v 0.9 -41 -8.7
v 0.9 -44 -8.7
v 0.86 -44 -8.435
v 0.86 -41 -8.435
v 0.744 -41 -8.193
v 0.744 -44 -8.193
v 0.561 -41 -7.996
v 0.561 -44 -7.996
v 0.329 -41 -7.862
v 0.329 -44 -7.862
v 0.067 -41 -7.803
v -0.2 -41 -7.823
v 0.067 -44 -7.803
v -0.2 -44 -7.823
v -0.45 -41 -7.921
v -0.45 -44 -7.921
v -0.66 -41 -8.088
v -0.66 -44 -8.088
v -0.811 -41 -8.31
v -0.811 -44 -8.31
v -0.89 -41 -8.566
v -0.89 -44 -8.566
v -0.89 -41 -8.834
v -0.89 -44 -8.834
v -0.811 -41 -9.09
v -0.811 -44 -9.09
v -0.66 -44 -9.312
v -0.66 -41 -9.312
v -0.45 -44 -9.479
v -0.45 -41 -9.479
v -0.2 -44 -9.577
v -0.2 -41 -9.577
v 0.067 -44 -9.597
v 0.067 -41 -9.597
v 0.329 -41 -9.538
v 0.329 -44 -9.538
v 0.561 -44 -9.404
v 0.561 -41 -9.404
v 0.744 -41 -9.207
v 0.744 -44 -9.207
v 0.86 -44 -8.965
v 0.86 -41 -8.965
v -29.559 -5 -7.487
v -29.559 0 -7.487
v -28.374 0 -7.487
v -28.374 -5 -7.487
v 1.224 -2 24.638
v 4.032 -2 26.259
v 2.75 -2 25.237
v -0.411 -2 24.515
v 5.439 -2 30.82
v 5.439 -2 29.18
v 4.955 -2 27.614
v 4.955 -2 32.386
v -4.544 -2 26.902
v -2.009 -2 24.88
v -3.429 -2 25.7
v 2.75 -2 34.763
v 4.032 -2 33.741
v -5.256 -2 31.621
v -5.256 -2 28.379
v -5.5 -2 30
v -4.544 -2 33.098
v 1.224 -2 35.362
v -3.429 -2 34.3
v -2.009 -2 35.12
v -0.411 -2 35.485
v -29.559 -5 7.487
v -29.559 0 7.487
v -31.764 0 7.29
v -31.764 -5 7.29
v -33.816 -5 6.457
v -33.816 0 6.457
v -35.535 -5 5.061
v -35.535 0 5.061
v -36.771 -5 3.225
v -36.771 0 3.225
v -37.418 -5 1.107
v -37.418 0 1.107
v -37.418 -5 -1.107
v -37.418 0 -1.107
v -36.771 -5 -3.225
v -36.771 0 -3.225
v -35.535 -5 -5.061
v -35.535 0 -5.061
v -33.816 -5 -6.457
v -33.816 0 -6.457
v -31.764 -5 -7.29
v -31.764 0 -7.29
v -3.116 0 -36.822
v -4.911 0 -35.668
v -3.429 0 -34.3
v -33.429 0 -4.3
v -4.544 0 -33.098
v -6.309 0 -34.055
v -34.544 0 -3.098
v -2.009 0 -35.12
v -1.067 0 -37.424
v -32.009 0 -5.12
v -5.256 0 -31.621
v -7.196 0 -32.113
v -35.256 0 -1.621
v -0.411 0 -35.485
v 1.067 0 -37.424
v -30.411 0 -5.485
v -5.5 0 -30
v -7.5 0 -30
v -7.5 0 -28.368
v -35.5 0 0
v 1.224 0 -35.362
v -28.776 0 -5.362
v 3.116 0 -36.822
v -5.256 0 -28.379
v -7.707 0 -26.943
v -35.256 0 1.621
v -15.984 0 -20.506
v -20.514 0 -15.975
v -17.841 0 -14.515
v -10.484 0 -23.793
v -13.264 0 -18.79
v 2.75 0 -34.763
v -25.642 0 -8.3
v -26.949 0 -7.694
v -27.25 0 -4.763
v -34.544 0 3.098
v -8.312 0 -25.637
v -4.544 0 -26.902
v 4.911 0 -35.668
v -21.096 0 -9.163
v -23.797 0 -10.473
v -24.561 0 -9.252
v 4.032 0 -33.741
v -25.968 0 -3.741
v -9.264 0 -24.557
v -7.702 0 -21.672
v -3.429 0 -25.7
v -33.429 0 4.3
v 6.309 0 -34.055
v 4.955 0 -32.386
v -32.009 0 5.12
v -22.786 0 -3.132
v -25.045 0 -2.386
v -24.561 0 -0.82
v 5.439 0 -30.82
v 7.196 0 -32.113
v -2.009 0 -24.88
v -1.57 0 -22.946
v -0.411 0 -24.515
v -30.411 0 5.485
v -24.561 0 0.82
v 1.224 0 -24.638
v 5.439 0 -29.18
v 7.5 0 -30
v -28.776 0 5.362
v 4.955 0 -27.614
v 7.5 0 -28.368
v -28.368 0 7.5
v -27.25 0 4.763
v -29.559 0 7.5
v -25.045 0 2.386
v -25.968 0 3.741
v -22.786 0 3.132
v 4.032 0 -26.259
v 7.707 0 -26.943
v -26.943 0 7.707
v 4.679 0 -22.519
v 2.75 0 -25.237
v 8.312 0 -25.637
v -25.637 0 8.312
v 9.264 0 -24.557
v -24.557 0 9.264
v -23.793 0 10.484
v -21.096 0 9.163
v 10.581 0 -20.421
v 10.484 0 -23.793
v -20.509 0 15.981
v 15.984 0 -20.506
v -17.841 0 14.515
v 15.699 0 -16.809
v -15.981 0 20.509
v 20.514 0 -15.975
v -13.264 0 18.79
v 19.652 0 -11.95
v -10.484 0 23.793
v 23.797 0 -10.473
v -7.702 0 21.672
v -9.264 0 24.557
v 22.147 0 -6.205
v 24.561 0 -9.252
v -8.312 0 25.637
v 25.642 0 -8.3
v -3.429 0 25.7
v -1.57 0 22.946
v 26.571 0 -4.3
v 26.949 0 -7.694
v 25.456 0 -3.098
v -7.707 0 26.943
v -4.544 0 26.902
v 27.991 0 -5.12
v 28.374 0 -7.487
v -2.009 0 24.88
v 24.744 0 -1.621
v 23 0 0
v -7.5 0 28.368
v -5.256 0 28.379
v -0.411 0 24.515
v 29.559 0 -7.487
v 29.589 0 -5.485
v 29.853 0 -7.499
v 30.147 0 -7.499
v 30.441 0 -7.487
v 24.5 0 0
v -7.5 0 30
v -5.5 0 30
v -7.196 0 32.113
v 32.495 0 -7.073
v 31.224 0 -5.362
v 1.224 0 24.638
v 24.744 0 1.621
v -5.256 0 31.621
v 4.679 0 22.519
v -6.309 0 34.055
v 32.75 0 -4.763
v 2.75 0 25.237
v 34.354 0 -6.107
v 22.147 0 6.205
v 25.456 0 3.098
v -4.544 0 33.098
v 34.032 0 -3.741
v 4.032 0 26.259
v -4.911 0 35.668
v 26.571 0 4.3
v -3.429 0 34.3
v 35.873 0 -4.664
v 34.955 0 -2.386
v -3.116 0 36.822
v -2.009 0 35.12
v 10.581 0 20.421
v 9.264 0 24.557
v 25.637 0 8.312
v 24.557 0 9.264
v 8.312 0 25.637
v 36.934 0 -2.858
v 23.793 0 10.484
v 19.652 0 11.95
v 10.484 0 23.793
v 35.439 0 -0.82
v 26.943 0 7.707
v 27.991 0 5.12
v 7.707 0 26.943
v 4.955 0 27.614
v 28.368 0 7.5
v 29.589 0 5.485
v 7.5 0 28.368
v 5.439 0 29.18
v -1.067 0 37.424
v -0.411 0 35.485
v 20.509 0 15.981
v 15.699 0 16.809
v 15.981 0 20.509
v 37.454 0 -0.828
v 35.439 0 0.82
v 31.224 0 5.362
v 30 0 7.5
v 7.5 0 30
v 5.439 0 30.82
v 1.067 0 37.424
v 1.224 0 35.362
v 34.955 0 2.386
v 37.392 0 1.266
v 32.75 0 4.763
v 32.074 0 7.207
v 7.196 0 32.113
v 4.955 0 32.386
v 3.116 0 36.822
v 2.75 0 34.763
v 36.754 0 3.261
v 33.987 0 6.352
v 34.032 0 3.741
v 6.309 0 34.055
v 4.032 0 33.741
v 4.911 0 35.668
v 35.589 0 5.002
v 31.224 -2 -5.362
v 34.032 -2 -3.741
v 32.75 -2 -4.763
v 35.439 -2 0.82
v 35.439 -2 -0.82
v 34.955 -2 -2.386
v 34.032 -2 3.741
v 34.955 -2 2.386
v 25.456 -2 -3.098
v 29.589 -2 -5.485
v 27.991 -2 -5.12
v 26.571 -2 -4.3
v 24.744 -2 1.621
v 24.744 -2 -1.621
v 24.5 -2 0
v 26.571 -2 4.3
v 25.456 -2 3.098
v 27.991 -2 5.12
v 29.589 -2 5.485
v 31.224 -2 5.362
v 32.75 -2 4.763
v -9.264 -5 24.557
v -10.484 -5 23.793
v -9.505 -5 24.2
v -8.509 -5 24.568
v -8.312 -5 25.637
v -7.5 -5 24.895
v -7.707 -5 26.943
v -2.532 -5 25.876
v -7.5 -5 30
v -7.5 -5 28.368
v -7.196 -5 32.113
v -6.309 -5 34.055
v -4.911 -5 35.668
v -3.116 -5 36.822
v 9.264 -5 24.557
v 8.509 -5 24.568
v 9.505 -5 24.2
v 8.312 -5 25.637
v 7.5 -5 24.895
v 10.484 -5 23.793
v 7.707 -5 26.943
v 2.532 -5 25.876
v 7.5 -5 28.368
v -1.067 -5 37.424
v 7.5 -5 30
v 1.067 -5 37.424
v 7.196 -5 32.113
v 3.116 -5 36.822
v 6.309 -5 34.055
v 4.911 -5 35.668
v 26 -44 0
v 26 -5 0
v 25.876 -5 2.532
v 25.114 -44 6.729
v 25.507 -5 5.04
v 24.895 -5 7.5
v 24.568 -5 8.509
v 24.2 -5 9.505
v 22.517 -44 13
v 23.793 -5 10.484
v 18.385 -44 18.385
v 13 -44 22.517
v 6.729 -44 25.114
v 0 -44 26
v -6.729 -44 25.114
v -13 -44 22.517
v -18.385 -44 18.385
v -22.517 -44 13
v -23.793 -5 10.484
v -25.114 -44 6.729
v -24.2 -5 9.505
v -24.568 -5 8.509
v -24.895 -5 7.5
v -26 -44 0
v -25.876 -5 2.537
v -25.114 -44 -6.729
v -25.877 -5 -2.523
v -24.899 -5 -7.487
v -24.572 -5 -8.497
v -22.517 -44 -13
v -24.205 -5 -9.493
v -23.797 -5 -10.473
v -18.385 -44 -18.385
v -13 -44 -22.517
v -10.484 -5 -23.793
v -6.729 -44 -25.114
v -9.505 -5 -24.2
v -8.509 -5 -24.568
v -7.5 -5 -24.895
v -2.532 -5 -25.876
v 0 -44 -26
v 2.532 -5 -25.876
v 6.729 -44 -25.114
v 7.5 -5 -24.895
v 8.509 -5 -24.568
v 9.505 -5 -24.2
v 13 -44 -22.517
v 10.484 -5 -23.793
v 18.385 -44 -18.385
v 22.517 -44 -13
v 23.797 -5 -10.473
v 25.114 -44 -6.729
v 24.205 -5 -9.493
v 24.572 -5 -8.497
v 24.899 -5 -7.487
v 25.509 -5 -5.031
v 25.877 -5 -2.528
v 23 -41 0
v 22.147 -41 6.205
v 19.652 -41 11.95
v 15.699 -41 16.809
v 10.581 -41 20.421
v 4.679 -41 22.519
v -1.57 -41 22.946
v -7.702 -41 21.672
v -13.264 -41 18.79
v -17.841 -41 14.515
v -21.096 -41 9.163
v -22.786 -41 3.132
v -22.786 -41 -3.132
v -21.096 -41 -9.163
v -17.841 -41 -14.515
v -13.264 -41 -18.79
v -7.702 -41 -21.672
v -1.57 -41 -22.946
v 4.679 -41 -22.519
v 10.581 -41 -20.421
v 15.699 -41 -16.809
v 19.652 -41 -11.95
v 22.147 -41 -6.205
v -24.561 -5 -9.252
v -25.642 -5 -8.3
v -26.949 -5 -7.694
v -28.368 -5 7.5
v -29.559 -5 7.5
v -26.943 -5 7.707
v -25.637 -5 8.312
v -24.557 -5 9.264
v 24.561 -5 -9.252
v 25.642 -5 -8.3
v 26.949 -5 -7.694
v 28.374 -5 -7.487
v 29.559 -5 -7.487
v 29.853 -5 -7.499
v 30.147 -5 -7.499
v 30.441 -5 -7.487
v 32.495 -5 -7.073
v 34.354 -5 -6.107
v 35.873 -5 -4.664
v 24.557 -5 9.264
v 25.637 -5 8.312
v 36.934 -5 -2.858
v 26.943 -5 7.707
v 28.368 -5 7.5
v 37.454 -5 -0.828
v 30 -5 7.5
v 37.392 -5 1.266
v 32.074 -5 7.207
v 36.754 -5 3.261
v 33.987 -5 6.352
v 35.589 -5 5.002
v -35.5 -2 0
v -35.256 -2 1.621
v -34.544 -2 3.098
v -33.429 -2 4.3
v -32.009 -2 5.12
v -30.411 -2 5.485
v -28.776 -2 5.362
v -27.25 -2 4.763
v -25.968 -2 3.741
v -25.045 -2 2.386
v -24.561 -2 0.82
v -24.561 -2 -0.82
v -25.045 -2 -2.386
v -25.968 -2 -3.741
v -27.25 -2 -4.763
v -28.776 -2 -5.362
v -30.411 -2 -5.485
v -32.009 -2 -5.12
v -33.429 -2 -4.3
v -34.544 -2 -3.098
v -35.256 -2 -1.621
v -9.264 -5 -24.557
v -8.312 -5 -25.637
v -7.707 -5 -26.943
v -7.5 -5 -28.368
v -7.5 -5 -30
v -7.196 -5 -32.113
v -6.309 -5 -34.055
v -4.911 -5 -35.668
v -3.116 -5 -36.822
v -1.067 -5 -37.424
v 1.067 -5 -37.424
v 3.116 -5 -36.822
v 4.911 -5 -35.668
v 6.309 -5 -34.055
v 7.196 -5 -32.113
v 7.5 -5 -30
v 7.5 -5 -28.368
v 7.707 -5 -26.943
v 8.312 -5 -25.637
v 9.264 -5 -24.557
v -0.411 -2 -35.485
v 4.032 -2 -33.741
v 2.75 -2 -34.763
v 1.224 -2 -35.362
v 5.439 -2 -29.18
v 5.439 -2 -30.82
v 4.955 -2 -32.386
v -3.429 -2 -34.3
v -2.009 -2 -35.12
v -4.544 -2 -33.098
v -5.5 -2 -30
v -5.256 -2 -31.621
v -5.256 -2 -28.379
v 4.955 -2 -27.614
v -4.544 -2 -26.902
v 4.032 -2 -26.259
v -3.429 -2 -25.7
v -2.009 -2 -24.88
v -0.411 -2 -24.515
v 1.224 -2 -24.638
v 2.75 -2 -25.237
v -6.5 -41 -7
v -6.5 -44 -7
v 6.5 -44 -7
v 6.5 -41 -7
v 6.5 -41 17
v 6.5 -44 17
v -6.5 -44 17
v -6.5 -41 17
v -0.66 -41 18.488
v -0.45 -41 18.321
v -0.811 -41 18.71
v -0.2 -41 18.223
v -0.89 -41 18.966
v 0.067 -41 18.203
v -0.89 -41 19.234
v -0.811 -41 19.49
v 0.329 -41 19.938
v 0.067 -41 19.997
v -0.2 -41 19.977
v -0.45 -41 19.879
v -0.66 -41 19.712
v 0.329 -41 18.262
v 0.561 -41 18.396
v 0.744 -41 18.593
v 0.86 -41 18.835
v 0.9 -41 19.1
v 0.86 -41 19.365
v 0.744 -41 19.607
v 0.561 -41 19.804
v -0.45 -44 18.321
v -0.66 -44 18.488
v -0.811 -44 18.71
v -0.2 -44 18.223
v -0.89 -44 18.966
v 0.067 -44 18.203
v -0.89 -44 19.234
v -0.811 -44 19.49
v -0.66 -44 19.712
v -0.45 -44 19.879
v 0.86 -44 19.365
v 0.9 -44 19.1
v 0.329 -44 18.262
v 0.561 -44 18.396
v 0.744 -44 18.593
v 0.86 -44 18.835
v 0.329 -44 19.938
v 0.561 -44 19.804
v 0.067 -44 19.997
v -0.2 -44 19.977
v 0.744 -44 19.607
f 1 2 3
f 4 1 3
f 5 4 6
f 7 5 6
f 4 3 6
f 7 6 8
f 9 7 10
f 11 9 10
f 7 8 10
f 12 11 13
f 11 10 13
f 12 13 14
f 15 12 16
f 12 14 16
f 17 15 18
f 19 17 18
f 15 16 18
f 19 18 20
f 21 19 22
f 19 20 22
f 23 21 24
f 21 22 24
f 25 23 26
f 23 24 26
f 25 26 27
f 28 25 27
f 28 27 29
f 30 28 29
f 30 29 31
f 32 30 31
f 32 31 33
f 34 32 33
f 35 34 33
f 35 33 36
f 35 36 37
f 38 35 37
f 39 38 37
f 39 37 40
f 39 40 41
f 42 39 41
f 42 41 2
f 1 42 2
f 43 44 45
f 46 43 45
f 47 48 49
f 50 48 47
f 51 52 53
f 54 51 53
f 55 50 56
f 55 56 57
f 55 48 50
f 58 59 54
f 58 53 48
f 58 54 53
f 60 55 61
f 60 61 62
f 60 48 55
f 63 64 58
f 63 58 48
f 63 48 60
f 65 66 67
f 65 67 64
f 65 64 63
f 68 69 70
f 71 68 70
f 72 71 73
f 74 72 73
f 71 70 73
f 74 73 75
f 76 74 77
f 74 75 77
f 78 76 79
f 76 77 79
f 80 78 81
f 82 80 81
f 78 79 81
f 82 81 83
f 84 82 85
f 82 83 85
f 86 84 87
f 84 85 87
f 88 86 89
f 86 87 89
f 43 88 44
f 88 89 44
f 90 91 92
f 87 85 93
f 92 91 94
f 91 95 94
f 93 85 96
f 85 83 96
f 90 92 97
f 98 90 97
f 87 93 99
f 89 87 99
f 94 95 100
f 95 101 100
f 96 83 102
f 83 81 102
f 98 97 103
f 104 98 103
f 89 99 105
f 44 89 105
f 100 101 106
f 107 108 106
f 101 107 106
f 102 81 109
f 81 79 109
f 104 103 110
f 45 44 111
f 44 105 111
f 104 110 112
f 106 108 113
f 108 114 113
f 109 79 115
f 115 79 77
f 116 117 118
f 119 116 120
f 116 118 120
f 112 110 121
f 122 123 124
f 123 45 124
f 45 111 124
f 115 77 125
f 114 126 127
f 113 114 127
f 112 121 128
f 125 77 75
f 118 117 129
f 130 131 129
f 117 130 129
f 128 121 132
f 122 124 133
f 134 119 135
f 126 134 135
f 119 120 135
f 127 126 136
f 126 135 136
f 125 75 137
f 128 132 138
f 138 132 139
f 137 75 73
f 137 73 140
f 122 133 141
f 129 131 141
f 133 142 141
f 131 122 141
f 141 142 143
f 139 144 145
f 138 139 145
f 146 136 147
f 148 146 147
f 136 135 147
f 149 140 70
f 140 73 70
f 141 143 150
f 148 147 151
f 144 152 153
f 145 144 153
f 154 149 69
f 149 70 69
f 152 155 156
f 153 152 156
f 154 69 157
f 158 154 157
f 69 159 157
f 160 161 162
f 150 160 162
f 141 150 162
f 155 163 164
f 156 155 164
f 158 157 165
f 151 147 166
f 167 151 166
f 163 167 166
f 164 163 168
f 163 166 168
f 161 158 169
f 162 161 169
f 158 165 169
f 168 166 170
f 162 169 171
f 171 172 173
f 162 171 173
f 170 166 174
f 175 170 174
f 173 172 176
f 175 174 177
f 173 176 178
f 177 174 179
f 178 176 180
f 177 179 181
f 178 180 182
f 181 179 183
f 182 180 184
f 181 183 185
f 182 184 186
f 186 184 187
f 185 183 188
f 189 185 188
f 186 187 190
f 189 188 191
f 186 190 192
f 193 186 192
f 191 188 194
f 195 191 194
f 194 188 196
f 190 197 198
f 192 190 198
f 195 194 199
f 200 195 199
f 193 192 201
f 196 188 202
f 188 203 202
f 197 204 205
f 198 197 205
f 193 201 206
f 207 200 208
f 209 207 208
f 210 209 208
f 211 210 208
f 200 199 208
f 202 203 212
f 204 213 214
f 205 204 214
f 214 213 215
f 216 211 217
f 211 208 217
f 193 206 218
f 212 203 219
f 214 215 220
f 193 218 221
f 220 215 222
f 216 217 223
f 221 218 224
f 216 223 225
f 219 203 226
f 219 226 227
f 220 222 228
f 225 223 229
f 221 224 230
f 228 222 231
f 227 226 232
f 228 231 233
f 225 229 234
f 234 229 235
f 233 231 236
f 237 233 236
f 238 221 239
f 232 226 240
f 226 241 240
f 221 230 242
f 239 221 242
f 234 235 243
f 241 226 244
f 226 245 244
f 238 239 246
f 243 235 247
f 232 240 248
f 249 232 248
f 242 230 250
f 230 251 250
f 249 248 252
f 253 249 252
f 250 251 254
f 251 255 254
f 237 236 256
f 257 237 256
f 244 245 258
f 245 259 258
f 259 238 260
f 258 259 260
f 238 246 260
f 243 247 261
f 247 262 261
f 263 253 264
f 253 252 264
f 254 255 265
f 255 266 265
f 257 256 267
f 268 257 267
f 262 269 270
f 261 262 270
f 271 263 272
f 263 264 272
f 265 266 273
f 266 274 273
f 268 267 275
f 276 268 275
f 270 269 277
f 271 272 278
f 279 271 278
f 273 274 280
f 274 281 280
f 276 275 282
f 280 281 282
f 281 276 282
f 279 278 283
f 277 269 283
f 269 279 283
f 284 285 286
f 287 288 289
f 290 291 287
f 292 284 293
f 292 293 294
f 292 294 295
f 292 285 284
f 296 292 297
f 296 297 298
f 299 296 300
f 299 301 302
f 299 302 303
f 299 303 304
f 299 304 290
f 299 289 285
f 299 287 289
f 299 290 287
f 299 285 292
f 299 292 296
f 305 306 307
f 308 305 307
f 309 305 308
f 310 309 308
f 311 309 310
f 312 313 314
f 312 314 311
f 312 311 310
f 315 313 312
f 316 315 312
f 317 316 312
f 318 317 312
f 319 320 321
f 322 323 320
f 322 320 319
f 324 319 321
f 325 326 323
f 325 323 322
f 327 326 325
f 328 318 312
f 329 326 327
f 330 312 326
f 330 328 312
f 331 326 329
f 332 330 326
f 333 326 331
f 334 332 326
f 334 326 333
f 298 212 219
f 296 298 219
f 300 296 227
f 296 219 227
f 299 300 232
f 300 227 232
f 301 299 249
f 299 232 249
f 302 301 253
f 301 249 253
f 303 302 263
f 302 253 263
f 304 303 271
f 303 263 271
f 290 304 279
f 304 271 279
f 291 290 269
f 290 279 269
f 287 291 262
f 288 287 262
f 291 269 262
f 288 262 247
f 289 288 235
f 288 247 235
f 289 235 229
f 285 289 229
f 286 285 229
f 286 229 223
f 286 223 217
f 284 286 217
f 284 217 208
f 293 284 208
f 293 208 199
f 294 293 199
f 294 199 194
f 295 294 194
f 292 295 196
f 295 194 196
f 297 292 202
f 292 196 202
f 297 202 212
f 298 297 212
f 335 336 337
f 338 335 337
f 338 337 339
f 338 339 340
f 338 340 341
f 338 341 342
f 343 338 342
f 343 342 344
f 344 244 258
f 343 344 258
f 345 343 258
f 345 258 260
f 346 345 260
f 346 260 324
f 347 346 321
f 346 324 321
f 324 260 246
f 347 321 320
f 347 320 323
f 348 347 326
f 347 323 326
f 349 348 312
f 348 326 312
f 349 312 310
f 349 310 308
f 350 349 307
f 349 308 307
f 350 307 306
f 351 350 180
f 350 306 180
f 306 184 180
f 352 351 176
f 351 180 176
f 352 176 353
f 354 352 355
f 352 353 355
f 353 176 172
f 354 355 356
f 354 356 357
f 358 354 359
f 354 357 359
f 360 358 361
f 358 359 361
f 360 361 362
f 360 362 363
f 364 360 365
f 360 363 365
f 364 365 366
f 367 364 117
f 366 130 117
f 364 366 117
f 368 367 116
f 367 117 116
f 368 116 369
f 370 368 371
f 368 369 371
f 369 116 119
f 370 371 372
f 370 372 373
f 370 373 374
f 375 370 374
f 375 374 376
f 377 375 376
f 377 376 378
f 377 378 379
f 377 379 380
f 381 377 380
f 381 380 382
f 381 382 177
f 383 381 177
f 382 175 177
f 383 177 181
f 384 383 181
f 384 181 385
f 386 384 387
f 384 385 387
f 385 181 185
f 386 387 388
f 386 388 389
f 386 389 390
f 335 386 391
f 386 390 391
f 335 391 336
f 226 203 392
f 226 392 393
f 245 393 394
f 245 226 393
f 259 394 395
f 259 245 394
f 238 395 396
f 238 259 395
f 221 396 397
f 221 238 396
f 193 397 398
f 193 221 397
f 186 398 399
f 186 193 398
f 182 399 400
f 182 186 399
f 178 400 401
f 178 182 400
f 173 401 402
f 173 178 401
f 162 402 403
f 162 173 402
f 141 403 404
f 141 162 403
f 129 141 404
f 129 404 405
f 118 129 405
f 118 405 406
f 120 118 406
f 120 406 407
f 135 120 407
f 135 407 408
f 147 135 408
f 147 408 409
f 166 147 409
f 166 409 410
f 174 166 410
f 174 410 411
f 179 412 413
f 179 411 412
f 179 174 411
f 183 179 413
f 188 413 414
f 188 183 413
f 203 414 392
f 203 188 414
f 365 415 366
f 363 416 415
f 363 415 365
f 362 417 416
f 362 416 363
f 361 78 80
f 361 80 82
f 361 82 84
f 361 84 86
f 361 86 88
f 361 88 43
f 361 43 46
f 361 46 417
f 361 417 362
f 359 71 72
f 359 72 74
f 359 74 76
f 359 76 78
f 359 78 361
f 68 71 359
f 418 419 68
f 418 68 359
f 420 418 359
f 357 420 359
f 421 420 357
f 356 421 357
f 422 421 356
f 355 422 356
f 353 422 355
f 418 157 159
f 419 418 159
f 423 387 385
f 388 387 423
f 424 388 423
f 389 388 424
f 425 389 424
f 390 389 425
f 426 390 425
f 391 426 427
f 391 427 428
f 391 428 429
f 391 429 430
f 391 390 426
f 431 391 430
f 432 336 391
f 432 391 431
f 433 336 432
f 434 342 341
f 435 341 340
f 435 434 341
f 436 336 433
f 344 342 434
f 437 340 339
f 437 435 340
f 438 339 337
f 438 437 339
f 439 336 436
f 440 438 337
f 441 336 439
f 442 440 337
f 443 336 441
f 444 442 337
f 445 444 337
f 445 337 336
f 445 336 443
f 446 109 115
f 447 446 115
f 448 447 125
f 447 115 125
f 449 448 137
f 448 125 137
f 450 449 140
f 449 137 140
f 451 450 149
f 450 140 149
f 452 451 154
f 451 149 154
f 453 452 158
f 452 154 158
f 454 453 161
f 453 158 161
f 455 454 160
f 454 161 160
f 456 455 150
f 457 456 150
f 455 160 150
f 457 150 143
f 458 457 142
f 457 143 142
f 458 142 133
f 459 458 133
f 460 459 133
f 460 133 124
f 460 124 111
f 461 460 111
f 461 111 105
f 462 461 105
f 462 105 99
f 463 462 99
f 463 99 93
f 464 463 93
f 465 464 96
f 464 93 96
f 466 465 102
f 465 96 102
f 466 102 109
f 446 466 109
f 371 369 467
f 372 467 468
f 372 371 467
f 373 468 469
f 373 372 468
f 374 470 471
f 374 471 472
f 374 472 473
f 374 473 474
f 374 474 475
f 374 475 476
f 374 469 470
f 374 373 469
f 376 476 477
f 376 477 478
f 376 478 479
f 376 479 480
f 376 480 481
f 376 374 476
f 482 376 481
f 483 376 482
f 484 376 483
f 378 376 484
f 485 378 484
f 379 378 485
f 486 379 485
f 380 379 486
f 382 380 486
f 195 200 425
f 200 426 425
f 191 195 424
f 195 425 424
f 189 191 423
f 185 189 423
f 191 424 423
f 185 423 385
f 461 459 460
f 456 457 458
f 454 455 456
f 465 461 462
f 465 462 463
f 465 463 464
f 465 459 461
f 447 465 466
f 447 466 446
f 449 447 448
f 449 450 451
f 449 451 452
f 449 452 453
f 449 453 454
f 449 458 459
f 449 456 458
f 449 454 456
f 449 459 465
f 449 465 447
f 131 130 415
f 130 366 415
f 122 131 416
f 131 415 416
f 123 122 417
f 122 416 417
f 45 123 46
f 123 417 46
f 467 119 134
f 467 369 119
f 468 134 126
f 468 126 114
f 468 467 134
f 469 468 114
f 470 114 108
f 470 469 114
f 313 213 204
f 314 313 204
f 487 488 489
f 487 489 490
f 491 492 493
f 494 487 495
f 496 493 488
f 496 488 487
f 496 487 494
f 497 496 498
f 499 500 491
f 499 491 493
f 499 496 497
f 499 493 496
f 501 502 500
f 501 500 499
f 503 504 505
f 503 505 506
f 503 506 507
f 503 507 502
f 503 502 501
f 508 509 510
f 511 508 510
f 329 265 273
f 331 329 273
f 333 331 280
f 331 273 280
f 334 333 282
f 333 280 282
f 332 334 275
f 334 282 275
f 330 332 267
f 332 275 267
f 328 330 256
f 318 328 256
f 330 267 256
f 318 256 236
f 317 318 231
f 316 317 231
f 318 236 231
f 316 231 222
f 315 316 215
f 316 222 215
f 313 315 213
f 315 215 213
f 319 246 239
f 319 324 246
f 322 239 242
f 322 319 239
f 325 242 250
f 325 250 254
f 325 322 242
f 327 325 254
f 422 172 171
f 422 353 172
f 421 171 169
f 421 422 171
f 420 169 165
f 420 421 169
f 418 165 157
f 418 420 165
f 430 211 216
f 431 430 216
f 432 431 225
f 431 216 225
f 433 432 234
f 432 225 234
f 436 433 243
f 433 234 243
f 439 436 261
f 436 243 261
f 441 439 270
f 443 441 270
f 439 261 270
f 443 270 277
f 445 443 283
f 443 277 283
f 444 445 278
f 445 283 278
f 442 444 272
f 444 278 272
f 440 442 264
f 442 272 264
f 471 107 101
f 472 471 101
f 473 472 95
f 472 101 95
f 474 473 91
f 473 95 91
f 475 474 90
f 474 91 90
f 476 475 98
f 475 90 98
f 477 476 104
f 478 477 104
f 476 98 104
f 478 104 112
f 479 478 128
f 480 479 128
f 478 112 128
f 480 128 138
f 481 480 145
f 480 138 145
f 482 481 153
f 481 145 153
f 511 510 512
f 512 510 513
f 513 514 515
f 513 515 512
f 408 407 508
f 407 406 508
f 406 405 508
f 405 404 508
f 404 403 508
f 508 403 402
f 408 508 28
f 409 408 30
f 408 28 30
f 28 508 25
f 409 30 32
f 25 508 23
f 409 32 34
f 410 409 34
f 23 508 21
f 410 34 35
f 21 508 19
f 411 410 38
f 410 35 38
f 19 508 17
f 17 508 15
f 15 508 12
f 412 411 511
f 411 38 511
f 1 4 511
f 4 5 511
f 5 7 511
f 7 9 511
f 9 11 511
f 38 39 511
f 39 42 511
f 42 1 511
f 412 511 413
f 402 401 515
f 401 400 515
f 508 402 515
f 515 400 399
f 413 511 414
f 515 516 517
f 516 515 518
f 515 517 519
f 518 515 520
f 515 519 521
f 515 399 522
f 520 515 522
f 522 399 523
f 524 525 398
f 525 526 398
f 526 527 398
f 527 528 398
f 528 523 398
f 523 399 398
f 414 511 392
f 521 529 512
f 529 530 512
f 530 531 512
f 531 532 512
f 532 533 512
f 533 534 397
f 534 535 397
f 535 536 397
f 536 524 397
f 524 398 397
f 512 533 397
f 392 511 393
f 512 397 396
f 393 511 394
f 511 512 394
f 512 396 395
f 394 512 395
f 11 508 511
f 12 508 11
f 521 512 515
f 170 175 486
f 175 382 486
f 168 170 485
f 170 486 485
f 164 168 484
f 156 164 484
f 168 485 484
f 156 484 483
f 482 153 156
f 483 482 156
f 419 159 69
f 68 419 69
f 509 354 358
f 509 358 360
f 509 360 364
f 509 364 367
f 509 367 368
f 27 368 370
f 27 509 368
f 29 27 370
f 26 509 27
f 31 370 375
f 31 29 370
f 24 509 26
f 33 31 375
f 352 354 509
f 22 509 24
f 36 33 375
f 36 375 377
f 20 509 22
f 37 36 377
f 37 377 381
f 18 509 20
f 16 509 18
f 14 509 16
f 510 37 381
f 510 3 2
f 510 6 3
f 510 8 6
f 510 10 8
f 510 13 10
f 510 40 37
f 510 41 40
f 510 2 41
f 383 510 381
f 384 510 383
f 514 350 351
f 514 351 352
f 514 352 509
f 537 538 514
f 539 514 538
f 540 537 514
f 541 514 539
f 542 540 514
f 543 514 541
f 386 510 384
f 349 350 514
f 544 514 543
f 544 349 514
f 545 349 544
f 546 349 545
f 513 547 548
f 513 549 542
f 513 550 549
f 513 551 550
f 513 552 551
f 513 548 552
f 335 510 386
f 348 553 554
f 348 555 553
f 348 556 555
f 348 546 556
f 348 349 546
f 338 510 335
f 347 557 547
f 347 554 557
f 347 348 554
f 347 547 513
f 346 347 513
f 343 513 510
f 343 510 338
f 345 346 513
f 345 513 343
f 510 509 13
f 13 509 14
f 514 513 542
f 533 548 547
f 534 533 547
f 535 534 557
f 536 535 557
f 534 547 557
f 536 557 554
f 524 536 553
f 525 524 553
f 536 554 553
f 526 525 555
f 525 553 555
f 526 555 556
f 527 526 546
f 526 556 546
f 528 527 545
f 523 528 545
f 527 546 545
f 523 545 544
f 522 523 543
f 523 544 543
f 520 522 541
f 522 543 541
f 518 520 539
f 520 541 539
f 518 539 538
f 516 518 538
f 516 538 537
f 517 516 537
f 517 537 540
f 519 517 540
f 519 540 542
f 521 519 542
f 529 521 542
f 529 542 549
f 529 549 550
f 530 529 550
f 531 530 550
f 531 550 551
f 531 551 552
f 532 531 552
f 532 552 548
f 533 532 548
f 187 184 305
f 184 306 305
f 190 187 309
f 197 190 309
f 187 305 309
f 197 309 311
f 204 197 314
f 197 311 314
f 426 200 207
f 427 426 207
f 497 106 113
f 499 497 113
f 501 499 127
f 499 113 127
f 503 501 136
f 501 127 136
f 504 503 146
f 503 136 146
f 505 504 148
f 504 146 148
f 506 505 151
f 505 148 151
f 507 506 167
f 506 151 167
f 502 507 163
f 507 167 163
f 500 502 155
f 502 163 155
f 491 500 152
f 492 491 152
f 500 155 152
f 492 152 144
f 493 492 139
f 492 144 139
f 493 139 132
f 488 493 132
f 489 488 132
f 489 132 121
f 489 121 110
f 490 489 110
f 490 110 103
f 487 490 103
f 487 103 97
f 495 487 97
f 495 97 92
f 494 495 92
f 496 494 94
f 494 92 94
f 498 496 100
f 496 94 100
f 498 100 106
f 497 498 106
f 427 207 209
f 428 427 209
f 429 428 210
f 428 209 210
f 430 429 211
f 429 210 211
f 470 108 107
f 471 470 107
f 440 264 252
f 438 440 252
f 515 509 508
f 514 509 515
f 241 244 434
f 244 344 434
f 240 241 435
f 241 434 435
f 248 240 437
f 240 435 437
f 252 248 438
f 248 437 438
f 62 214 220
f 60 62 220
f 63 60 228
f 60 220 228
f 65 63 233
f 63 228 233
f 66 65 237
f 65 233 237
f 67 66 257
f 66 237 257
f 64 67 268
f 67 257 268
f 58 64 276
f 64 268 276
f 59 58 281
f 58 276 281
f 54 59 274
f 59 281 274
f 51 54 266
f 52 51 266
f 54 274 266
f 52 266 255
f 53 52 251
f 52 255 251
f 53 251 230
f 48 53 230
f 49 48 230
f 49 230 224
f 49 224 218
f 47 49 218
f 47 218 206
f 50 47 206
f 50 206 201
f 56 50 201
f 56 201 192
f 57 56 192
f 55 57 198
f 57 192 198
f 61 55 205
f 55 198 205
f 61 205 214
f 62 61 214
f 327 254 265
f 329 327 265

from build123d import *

# Parameters (mm, degrees)
F0_R      = 26
F1_DEPTH  = 44
F2_T      = -3
F4_DEPTH  = 5
F5_W      = 13
F5_H      = 24
F6_DEPTH  = 25
F7_R      = 0.9
F8_DEPTH  = 44.001
F9_R      = 5.5
F10_DEPTH = 2
F11_R     = 5


with BuildPart() as f1:
    # F0 (on Front) → F1 (new body)
    with BuildSketch(Plane.XZ):
        Circle(F0_R)
    extrude(amount=F1_DEPTH)

    # F2
    f2_openings = [f1.faces().sort_by_distance(p)[0] for p in [
        (0, 0, 0),
    ]]
    offset(amount=F2_T, openings=f2_openings)

    # F3 (on Front) → F4 (join)
    with BuildSketch(Plane.XZ):
        with BuildLine():
            ThreePointArc((-24.8986899768, -7.4870045706), (-25.9999991145, 0.0067856521), (-24.894778569, 7.5))
            Line((-24.894778569, 7.5), (-29.5586808862, 7.5))
            Line((-29.5586808862, 7.5), (-29.5586808862, 7.4870045706))
            ThreePointArc((-29.5586808862, 7.4870045706), (-37.5, 0), (-29.5586808862, -7.4870045706))
            Line((-29.5586808862, -7.4870045706), (-24.8986899768, -7.4870045706))
        make_face()
        with BuildLine():
            Line((7.5, 24.894778569), (7.5, 30))
            ThreePointArc((7.5, 30), (0, 37.5), (-7.5, 30))
            Line((-7.5, 30), (-7.5, 24.894778569))
            ThreePointArc((-7.5, 24.894778569), (0, 26), (7.5, 24.894778569))
        make_face()
        with BuildLine():
            Line((-7.5, -24.894778569), (-7.5, -30))
            ThreePointArc((-7.5, -30), (0, -37.5), (7.5, -30))
            Line((7.5, -30), (7.5, -24.894778569))
            ThreePointArc((7.5, -24.894778569), (0, -26), (-7.5, -24.894778569))
        make_face()
        with BuildLine():
            Line((30.4413191138, -7.4870045706), (29.5586808862, -7.4870045706))
            ThreePointArc((29.5586808862, -7.4870045706), (30, -7.5), (30.4413191138, -7.4870045706))
        make_face()
        with BuildLine():
            Line((24.8986899768, -7.4870045706), (29.5586808862, -7.4870045706))
            Line((29.5586808862, -7.4870045706), (30.4413191138, -7.4870045706))
            ThreePointArc((30.4413191138, -7.4870045706), (37.4967504387, 0.2207552046), (30, 7.5))
            Line((30, 7.5), (24.894778569, 7.5))
            ThreePointArc((24.894778569, 7.5), (25.9999991145, 0.0067856521), (24.8986899768, -7.4870045706))
        make_face()
    extrude(amount=F4_DEPTH)

    # F5 (on face) → F6 (cut)
    with BuildSketch(Plane.XZ.offset(44)):
        with Locations((0, 5)):
            Rectangle(F5_W, F5_H)
    extrude(amount=-F6_DEPTH, mode=Mode.SUBTRACT)

    # F7 (on face) → F8 (cut, through all)
    with BuildSketch(Plane.XZ.offset(44)):
        with Locations((0, -8.7)):
            Circle(F7_R)
        with Locations((0, 19.1)):
            Circle(F7_R)
    extrude(amount=-F8_DEPTH, mode=Mode.SUBTRACT)

    # F9 (on face) → F10 (cut)
    with BuildSketch(Plane(origin=(0, 0, 0), x_dir=(-1, 0, 0), z_dir=(0, 1, 0))):
        with Locations((-30, 0)):
            Circle(F9_R)
        with Locations((0, 30)):
            Circle(F9_R)
        with Locations((30, 0)):
            Circle(F9_R)
        with Locations((0, -30)):
            Circle(F9_R)
    extrude(amount=-F10_DEPTH, mode=Mode.SUBTRACT)

    # F11
    f11_edges = [f1.edges().sort_by_distance(p)[0] for p in [
        (24.89869, -2.5, -7.487005),
        (7.5, -2.5, -24.894779),
        (-7.5, -2.5, -24.894779),
        (-24.89869, -2.5, -7.487005),
        (-24.894779, -2.5, 7.5),
        (-7.5, -2.5, 24.894779),
        (7.5, -2.5, 24.894779),
        (24.894779, -2.5, 7.5),
    ]]
    fillet(f11_edges, radius=F11_R)


solid = f1.part
